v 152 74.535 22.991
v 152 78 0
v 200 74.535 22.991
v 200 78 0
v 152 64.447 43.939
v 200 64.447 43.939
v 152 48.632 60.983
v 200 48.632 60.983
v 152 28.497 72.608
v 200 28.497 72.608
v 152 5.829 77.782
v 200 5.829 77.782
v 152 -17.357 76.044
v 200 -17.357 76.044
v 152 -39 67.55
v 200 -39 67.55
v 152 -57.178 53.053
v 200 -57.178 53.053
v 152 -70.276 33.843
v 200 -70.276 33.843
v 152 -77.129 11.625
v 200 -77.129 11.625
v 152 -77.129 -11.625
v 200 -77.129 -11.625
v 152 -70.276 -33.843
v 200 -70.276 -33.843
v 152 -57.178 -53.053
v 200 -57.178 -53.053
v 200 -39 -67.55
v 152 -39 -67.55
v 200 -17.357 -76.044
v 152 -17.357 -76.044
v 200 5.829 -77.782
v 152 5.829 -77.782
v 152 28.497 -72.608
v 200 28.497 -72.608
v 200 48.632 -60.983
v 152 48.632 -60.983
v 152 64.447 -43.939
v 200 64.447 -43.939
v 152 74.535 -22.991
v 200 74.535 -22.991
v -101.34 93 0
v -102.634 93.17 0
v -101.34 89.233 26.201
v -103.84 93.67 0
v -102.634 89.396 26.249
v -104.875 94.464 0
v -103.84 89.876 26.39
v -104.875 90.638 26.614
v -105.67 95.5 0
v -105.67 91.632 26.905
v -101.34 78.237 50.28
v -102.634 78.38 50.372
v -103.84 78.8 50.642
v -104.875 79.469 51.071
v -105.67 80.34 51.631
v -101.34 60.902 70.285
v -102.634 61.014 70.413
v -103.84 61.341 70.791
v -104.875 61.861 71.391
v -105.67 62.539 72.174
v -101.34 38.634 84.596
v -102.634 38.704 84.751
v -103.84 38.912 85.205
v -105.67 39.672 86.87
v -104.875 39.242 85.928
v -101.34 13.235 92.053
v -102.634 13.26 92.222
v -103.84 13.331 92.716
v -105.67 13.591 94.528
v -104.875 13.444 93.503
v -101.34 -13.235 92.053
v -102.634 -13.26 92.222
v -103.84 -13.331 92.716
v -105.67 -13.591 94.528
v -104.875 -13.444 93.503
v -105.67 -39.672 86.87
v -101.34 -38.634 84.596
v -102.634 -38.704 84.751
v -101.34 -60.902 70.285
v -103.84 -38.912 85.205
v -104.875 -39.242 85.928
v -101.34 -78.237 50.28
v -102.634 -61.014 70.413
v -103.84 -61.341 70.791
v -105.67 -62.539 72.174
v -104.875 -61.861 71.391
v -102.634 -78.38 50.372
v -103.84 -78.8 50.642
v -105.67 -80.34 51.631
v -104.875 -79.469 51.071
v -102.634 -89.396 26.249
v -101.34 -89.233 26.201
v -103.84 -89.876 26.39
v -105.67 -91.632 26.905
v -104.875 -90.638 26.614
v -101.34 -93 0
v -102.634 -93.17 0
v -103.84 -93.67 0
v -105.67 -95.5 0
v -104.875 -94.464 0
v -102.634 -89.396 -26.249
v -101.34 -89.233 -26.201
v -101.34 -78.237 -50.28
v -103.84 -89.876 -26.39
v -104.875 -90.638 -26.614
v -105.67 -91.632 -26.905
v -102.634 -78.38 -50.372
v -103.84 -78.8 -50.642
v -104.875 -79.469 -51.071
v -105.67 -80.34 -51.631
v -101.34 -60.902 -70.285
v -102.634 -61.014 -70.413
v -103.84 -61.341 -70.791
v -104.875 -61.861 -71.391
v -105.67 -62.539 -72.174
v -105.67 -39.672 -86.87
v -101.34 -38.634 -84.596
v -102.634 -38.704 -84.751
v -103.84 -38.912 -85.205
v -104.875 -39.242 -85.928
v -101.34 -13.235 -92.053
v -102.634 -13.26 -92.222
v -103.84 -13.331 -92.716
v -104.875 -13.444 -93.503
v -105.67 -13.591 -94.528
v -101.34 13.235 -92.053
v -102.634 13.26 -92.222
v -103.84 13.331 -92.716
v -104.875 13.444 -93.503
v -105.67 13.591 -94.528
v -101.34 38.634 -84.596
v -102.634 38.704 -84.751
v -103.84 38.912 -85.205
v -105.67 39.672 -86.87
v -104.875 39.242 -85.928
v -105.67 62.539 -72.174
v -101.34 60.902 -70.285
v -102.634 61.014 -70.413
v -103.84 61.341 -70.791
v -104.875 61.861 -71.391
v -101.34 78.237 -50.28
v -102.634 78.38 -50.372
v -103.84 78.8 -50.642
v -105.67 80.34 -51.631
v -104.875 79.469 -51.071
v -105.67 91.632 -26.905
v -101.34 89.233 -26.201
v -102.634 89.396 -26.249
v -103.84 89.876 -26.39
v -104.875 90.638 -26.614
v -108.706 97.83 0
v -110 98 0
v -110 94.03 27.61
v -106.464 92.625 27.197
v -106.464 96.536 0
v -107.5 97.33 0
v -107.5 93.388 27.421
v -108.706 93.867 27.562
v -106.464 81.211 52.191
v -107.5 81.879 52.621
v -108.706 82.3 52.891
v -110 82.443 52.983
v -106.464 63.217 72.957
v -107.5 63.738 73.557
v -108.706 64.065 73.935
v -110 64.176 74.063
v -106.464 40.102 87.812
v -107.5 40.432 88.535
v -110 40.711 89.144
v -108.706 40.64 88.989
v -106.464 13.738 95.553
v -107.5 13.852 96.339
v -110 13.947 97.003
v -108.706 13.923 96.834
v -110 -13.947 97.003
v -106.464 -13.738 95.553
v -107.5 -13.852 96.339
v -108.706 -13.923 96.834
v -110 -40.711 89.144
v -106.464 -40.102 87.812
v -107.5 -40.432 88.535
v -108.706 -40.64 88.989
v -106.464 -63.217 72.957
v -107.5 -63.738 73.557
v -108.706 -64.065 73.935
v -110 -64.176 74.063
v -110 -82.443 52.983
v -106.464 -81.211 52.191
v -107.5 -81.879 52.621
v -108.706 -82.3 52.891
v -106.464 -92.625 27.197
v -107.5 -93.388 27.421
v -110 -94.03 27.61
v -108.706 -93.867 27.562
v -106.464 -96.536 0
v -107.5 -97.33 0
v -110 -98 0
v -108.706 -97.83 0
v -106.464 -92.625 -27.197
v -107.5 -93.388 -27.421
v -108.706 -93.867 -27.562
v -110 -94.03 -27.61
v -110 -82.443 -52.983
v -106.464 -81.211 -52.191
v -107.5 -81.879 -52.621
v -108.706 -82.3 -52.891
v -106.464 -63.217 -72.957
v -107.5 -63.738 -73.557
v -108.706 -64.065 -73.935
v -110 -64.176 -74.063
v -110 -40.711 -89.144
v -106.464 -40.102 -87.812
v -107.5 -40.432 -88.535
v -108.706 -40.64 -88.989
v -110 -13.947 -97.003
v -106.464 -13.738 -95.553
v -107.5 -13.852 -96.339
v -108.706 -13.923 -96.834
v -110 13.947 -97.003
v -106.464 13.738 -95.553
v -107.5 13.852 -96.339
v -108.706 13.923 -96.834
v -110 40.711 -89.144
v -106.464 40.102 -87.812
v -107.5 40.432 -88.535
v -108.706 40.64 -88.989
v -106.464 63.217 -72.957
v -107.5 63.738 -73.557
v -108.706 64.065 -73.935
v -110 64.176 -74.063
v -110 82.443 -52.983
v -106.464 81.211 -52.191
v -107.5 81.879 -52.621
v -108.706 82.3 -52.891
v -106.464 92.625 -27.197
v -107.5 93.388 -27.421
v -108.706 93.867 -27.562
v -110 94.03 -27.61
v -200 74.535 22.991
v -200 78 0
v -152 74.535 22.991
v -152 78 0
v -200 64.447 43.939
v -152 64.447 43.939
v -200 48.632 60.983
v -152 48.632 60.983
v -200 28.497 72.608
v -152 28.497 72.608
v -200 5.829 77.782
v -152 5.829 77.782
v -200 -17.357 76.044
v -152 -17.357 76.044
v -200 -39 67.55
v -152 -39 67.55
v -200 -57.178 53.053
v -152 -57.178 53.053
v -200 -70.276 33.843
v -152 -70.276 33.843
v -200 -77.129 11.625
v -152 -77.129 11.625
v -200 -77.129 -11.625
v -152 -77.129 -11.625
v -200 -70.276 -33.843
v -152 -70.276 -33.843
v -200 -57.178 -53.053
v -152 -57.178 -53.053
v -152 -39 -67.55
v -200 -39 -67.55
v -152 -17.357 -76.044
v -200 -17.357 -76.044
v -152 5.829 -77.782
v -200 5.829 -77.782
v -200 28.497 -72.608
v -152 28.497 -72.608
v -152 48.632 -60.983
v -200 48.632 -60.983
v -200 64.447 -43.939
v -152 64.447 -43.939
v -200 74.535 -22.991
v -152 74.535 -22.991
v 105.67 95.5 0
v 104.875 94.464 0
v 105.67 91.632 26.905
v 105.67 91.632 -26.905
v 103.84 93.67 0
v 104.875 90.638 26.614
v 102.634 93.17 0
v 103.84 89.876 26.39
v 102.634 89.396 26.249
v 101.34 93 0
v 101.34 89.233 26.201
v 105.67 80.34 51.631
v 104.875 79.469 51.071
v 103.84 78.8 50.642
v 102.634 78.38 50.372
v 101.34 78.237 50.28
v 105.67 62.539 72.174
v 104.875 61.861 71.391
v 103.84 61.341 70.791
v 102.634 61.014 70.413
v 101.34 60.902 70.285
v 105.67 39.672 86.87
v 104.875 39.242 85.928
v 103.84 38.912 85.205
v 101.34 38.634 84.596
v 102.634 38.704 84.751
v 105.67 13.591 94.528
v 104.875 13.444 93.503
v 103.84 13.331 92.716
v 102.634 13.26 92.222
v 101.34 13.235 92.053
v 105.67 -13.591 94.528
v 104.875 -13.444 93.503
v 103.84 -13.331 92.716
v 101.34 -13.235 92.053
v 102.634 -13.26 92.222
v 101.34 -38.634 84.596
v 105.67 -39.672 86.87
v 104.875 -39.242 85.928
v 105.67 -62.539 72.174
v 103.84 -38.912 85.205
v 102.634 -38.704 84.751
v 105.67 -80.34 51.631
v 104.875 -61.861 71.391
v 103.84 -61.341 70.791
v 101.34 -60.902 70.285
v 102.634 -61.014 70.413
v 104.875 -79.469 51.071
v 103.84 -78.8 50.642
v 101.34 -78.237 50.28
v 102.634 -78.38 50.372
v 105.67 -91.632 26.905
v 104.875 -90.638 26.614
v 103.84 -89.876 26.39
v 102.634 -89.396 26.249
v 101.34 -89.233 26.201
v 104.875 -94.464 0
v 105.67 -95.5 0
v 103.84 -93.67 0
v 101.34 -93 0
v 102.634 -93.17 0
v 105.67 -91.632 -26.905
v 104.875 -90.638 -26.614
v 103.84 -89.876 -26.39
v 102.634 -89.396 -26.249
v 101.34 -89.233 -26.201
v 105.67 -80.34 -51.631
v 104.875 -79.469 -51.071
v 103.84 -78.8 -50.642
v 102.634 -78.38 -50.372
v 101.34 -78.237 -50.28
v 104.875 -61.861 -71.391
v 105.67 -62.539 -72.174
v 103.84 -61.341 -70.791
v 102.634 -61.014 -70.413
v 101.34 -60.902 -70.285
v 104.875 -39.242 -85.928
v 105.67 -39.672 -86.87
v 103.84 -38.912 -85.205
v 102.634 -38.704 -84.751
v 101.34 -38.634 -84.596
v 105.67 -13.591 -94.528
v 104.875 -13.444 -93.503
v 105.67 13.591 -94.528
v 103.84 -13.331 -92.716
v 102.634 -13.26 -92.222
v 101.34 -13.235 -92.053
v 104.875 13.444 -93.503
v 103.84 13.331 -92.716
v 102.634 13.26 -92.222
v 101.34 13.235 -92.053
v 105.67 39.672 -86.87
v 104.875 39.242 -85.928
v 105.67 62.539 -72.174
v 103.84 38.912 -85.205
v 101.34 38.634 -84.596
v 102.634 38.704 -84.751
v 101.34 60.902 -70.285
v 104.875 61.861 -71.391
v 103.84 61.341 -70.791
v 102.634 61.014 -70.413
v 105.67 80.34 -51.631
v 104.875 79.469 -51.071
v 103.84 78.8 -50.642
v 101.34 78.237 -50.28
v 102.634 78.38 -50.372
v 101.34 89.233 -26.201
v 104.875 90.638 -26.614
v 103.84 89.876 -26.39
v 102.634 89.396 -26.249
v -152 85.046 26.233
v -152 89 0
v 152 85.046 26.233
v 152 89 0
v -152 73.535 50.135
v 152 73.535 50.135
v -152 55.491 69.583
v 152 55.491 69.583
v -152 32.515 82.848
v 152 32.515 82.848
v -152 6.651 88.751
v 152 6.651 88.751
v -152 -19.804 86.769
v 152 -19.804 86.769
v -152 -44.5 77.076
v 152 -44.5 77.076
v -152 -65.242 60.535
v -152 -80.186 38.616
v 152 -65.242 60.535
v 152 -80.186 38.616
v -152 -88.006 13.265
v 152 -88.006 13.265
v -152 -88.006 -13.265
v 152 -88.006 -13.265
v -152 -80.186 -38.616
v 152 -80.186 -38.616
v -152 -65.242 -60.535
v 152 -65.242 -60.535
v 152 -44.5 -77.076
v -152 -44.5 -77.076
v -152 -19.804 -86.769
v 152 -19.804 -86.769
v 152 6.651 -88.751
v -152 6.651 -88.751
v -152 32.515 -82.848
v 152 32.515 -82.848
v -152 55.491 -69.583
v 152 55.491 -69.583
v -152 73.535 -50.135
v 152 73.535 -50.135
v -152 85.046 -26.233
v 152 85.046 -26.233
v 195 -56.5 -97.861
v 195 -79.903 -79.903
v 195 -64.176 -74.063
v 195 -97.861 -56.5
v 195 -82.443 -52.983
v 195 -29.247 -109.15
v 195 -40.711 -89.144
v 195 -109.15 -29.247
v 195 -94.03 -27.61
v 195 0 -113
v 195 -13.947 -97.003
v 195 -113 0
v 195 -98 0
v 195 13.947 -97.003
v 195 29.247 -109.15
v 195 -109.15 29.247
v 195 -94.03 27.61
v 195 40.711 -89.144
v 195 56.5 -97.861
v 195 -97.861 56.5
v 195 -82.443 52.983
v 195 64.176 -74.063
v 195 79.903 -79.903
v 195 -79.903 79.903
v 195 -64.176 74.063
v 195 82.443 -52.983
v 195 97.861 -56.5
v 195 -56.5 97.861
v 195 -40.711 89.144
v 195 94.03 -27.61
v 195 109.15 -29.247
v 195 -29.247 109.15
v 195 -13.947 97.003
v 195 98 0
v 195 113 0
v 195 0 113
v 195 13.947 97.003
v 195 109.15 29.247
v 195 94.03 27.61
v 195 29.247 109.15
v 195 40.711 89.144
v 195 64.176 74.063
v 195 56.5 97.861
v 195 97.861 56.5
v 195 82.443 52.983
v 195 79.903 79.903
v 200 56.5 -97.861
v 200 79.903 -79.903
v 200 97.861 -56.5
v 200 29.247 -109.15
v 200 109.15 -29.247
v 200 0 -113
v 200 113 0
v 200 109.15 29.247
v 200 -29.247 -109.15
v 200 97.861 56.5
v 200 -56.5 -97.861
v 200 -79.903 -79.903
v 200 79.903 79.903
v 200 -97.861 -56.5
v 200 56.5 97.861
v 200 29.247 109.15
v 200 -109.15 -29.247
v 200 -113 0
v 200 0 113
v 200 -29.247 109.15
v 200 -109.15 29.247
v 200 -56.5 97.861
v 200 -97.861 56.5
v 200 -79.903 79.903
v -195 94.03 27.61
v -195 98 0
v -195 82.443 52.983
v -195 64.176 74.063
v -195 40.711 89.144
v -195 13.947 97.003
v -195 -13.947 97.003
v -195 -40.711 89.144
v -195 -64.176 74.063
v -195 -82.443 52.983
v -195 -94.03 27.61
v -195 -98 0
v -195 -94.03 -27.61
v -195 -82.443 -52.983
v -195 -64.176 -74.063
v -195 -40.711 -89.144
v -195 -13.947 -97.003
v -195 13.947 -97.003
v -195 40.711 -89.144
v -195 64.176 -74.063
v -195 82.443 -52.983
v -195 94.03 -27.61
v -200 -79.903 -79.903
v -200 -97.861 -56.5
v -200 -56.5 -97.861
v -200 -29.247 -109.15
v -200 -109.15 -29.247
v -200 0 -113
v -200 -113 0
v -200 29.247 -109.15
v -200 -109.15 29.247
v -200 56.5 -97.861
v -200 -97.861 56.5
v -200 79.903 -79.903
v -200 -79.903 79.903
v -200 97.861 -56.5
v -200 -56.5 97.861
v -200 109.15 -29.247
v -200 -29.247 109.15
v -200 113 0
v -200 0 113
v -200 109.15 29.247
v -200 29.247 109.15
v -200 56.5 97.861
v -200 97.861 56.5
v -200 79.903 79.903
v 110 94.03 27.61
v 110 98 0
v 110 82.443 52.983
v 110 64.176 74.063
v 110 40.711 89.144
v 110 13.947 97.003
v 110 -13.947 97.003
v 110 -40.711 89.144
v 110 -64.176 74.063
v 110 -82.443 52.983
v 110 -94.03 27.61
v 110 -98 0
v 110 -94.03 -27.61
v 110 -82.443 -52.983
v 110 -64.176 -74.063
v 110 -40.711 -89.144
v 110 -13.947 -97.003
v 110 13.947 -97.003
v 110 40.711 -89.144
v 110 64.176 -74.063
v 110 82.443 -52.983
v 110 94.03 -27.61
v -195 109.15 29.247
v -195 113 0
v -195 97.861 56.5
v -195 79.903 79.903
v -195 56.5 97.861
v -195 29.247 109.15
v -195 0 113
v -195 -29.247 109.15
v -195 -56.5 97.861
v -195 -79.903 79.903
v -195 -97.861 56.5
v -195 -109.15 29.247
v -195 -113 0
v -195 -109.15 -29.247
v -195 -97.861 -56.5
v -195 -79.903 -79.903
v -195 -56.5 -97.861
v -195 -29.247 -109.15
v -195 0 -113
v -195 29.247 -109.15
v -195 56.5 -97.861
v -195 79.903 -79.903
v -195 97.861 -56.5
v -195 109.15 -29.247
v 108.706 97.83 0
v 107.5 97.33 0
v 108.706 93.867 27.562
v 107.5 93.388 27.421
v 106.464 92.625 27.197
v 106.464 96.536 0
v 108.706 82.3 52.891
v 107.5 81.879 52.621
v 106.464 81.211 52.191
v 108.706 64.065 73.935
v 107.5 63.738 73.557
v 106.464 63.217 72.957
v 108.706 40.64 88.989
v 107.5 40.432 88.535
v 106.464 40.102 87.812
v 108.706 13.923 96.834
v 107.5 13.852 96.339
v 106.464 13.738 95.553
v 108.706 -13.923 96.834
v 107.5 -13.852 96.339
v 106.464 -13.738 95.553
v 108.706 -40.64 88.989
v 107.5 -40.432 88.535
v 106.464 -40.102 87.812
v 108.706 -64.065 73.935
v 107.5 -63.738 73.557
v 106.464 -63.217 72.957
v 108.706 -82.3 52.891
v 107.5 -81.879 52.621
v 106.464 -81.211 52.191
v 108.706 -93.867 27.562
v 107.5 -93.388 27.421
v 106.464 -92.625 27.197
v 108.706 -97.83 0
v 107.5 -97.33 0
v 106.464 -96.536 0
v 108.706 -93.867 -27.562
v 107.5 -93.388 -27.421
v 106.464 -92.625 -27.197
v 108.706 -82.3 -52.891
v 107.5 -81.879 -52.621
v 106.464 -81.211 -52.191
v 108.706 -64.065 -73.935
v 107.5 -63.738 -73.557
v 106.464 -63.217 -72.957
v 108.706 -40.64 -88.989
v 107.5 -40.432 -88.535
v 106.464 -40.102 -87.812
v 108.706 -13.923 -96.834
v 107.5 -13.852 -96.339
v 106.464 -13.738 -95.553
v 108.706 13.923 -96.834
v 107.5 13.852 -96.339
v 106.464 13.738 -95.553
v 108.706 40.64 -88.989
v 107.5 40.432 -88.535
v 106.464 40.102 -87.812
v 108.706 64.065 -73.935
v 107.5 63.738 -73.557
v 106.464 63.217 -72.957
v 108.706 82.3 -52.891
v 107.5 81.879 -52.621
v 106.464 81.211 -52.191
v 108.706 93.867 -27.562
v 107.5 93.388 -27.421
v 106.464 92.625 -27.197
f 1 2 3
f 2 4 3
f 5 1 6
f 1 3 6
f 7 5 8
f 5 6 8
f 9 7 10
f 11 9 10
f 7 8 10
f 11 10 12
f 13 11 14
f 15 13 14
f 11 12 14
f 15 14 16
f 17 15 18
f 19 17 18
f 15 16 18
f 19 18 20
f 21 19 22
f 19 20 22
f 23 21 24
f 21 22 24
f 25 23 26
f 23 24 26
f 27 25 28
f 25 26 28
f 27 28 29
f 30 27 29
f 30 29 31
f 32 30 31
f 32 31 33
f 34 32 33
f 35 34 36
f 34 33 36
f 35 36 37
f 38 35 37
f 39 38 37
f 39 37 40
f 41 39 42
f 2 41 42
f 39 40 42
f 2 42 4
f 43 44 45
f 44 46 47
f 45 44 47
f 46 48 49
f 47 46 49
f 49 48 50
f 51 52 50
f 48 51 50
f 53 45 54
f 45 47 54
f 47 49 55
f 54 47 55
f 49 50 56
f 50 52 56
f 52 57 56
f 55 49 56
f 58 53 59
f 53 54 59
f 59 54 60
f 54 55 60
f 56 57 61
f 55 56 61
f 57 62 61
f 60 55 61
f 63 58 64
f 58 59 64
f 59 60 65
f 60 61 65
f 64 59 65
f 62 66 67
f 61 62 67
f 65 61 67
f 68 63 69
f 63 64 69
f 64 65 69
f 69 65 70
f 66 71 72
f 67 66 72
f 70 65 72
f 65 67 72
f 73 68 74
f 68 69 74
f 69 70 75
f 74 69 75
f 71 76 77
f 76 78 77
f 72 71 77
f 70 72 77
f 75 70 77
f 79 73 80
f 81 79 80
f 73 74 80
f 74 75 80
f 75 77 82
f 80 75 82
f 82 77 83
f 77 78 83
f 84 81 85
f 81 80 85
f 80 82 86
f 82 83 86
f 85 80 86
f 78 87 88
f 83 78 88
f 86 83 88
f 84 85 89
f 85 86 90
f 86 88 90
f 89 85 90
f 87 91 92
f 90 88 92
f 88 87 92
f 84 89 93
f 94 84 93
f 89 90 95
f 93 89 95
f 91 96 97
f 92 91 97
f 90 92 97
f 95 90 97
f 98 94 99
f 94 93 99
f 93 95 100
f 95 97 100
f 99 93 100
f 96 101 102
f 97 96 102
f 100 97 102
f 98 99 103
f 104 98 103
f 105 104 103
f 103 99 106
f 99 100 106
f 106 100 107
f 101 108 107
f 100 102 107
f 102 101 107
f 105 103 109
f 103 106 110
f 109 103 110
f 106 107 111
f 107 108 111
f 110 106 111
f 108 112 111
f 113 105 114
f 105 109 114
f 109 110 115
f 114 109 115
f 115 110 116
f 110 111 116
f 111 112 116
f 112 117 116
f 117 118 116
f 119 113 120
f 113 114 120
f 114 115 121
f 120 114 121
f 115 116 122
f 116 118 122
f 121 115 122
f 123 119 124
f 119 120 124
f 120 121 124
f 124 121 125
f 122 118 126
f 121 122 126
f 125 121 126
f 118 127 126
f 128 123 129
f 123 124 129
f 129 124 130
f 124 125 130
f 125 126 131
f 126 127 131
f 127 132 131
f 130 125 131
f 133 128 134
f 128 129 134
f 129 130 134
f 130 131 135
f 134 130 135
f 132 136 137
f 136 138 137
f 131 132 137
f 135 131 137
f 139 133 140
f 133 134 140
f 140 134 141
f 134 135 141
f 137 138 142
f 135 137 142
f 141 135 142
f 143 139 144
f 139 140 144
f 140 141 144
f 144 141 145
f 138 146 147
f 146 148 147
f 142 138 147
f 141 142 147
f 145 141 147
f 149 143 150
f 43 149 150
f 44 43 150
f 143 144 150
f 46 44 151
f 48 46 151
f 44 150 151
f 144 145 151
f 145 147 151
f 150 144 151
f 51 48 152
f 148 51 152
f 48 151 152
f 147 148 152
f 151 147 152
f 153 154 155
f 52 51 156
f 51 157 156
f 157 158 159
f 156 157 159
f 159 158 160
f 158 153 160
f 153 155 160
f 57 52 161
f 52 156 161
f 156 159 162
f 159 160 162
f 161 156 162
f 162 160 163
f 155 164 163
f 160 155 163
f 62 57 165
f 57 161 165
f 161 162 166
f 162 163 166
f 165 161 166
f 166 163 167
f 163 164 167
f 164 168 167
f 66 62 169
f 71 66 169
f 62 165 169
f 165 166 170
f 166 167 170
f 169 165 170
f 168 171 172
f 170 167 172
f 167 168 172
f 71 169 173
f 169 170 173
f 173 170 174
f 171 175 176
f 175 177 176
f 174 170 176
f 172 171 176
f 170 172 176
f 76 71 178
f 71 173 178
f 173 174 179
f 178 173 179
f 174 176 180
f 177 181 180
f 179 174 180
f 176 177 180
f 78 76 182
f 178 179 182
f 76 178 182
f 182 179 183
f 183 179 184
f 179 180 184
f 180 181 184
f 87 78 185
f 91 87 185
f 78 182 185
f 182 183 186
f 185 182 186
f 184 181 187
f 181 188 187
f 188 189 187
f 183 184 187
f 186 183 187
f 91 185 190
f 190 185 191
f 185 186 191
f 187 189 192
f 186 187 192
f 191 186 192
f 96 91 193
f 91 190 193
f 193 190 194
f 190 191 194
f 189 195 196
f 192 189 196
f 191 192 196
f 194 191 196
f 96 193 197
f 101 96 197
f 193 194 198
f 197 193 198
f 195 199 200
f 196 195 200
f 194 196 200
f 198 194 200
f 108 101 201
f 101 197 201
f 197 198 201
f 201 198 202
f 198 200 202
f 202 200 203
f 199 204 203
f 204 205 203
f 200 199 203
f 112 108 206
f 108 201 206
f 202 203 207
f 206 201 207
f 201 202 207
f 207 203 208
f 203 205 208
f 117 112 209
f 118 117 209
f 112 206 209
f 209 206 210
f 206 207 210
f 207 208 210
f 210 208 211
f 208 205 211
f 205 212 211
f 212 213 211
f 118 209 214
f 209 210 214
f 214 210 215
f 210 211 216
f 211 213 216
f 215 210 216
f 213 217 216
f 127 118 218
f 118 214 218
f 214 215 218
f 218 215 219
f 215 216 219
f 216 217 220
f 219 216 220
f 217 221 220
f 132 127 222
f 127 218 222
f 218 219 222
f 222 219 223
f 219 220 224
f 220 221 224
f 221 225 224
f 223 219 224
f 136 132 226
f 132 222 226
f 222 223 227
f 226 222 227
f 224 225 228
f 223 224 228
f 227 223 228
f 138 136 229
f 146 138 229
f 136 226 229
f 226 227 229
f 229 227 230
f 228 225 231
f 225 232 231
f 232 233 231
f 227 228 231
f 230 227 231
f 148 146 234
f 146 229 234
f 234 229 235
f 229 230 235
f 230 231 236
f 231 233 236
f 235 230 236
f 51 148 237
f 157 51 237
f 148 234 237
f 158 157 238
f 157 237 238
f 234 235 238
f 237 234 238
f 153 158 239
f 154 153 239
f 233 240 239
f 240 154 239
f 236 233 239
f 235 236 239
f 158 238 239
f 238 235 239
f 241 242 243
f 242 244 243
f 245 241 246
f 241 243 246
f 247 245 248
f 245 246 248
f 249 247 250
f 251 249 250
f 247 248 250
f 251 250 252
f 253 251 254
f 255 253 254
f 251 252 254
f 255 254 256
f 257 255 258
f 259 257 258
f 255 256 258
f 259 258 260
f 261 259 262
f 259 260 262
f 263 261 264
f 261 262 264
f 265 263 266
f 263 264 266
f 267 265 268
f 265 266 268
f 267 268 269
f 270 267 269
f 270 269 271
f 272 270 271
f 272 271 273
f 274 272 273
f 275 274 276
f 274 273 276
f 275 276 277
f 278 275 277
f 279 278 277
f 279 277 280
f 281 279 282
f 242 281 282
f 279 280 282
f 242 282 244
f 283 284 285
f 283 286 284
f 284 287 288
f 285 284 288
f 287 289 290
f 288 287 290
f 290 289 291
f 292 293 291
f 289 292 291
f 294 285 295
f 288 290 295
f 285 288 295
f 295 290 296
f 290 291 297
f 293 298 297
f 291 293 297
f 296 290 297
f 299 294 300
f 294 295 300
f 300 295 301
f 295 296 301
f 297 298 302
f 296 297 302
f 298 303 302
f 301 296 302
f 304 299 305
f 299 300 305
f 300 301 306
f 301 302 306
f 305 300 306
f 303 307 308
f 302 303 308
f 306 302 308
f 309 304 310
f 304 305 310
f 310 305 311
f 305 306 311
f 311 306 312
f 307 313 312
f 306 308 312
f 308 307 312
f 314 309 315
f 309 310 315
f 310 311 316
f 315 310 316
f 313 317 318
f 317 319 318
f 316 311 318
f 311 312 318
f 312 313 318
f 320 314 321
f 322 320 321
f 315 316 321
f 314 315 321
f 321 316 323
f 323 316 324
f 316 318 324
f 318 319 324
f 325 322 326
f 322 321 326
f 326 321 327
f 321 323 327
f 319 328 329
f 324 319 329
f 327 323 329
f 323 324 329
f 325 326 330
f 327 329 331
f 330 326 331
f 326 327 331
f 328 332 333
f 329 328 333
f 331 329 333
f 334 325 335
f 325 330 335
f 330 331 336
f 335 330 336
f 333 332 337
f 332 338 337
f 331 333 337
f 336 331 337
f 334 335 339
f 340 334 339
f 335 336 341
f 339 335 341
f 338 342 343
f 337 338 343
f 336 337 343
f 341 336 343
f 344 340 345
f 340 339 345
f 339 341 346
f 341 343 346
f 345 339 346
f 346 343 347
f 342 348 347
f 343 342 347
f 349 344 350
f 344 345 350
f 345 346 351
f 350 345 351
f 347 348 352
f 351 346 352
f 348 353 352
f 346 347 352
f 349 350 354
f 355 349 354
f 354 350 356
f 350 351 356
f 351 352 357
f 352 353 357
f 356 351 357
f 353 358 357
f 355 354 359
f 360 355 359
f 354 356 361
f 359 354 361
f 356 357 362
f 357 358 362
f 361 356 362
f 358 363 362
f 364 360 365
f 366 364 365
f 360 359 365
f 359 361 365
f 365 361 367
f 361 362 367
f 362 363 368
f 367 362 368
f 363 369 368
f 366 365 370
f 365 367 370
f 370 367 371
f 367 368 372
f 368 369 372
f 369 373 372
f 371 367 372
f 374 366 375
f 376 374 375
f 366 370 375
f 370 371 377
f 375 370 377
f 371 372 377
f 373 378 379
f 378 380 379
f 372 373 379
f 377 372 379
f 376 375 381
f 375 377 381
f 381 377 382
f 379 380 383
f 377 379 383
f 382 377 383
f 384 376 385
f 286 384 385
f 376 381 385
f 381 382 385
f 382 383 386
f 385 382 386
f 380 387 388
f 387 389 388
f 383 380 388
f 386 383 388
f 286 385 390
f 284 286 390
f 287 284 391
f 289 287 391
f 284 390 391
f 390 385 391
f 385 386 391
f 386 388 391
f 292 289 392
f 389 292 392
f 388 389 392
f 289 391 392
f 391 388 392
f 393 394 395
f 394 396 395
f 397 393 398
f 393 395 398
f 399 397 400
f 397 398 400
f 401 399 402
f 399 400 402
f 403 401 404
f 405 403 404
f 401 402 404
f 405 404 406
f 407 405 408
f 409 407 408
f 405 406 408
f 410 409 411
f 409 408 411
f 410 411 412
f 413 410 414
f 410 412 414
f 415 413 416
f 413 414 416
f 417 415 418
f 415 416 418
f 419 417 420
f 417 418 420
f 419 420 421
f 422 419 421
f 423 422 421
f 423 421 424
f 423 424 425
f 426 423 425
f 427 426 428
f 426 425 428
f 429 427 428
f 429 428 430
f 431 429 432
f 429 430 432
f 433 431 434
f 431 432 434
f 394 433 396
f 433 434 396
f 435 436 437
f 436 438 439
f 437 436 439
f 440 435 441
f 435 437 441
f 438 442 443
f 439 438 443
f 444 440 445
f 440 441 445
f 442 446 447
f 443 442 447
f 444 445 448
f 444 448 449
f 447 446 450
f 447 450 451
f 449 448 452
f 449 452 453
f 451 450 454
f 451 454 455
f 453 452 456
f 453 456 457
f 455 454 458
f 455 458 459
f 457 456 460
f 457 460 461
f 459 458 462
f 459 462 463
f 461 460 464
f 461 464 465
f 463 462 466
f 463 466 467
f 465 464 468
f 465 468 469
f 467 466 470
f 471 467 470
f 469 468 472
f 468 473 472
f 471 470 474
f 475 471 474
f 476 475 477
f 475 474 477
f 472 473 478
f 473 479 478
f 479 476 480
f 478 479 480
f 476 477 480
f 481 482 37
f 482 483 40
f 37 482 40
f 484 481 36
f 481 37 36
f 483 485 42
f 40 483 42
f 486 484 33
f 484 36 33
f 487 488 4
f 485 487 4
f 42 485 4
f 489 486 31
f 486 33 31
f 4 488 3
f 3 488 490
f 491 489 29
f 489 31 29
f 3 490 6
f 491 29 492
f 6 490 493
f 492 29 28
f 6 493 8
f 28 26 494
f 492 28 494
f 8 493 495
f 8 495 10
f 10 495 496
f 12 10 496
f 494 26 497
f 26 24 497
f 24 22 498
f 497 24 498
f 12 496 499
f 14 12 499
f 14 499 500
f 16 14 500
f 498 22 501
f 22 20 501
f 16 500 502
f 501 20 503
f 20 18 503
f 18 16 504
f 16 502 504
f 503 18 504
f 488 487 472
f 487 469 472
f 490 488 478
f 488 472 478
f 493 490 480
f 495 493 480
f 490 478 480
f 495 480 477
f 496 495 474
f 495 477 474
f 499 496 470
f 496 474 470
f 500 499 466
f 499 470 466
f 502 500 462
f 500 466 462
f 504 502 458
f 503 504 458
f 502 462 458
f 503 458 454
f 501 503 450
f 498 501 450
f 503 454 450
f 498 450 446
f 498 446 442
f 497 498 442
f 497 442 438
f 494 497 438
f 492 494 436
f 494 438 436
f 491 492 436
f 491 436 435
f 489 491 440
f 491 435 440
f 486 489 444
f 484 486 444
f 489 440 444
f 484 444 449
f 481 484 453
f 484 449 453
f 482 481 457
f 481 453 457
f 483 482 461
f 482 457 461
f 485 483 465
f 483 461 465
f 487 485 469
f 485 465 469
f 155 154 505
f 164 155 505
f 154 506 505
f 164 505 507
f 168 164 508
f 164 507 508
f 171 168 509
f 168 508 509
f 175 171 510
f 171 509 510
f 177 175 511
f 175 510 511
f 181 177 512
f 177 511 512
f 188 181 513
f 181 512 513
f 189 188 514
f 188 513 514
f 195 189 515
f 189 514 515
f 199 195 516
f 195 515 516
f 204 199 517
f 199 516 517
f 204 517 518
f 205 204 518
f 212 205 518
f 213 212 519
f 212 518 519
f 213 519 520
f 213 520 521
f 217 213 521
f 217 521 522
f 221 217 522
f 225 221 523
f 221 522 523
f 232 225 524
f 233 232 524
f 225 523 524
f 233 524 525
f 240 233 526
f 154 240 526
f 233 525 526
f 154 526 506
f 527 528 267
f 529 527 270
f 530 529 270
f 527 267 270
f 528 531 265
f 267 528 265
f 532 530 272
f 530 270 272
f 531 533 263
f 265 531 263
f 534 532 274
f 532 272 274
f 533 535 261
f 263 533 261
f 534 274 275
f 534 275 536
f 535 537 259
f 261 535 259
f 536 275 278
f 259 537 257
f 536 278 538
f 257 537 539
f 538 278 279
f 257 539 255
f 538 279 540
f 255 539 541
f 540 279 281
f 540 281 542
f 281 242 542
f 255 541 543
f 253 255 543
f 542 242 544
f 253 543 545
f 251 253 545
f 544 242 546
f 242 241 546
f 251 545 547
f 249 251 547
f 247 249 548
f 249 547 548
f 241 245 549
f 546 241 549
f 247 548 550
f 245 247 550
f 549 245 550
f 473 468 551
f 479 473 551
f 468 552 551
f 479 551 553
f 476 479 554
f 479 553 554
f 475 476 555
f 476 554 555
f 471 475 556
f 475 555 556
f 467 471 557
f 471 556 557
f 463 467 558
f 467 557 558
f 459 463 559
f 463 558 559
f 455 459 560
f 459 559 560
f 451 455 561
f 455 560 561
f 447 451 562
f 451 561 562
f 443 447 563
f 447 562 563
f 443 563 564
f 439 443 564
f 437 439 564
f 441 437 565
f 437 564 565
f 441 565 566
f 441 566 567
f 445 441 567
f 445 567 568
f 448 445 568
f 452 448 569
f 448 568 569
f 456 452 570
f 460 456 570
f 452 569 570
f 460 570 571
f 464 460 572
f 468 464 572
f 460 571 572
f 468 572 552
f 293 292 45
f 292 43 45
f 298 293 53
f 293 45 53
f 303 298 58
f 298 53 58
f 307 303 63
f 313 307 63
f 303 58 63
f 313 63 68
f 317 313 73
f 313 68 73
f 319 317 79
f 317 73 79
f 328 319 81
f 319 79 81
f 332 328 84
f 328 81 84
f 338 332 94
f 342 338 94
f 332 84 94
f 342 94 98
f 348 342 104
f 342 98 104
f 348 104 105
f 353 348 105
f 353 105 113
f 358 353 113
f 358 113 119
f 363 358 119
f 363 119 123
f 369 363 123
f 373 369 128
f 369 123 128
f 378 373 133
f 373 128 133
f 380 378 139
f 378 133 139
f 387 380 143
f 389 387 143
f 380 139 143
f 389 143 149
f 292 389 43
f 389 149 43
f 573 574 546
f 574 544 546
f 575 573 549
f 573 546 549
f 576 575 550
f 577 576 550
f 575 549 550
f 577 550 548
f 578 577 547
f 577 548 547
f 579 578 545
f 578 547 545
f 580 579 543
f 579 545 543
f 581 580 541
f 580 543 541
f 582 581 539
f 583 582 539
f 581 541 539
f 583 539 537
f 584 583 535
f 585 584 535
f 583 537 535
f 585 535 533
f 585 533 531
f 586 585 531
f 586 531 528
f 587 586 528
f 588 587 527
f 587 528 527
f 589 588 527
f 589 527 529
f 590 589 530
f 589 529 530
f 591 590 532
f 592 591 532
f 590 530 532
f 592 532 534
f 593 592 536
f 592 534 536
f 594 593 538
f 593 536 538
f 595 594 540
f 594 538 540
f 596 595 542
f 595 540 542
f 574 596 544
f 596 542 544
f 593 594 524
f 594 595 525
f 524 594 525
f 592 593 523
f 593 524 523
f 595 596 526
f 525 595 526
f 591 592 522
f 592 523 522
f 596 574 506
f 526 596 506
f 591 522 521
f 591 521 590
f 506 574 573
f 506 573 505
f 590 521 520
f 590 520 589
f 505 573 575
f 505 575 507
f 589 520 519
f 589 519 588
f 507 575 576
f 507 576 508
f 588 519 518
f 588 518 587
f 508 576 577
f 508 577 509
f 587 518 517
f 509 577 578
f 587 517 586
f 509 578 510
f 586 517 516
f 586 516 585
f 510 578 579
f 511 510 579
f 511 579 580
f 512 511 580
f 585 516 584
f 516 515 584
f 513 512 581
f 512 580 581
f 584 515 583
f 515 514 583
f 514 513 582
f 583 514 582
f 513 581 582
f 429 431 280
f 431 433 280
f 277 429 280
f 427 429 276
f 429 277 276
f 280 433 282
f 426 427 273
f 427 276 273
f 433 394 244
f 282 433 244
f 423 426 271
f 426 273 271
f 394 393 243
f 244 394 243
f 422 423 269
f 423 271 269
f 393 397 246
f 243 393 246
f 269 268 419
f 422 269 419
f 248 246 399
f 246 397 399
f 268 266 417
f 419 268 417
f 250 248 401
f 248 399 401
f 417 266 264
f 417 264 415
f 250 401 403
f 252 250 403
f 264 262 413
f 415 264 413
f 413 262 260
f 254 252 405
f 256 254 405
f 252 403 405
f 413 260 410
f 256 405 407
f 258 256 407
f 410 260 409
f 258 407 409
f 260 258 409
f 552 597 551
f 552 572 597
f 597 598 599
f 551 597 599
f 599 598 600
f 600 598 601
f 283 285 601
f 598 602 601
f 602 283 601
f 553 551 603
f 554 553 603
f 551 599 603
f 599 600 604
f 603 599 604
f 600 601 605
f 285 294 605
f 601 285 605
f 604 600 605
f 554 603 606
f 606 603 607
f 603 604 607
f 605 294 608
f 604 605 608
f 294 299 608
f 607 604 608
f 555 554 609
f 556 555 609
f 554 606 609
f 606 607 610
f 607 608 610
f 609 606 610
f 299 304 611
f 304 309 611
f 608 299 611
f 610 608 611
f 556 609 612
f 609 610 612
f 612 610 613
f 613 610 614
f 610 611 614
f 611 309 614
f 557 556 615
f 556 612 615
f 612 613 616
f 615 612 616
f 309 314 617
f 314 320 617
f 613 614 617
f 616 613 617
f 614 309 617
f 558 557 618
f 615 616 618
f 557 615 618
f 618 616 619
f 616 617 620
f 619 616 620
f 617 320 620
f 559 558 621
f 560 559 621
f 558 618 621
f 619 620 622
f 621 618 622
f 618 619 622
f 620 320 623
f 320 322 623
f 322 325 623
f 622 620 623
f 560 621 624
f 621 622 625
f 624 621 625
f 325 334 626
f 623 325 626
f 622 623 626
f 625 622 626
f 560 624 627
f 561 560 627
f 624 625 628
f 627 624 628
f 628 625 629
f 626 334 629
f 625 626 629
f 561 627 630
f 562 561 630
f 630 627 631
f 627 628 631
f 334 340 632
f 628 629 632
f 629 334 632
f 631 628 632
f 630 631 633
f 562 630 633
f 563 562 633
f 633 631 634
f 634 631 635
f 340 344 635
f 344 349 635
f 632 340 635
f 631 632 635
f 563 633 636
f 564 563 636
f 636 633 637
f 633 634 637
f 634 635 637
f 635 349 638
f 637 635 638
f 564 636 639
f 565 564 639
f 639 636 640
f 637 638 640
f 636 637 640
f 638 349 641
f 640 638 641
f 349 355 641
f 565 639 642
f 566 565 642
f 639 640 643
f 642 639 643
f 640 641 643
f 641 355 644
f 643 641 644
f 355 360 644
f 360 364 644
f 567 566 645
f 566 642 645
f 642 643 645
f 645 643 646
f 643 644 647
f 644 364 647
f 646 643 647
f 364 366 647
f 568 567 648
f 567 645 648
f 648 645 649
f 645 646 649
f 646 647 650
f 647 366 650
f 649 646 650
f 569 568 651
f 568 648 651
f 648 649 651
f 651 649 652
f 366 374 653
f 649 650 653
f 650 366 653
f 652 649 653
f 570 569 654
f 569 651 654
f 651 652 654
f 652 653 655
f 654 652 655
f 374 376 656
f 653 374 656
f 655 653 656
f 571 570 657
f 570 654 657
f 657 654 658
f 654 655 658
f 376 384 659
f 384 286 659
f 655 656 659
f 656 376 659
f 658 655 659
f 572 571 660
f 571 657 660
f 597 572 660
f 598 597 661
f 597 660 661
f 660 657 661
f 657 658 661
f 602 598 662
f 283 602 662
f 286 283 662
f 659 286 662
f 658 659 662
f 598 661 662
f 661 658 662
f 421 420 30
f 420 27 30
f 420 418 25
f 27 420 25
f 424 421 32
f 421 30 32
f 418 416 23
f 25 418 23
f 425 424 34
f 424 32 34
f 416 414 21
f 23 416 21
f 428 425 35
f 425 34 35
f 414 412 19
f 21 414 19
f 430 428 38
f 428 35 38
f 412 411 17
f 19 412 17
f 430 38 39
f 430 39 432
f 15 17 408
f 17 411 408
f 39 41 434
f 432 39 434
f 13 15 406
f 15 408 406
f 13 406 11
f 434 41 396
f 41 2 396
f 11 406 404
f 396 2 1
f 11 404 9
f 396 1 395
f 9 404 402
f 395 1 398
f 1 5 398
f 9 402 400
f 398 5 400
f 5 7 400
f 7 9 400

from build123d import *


with BuildPart() as f1:
    # F0 (on Top) → F1 (revolve)
    with BuildSketch(Plane.XY):
        with BuildLine():
            ThreePointArc((-105.669873, 95.5), (-107.5, 97.330127), (-110, 98))
            Line((-110, 98), (-195, 98))
            Line((-195, 98), (-195, 113))
            Line((-195, 113), (-200, 113))
            Line((-200, 113), (-200, 98))
            Line((-200, 98), (-200, 78))
            Line((-200, 78), (-152, 78))
            Line((-152, 78), (-152, 89))
            Line((-152, 89), (0, 89))
            Line((0, 89), (0, 93))
            Line((0, 93), (-101.339746, 93))
            ThreePointArc((-101.339746, 93), (-103.839746, 93.669873), (-105.669873, 95.5))
        make_face()
        with BuildLine():
            Line((101.339746, 93), (0, 93))
            Line((0, 93), (0, 89))
            Line((0, 89), (152, 89))
            Line((152, 89), (152, 78))
            Line((152, 78), (200, 78))
            Line((200, 78), (200, 98))
            Line((200, 98), (200, 113))
            Line((200, 113), (195, 113))
            Line((195, 113), (195, 98))
            Line((195, 98), (110, 98))
            ThreePointArc((110, 98), (107.5, 97.330127), (105.669873, 95.5))
            ThreePointArc((105.669873, 95.5), (103.839746, 93.669873), (101.339746, 93))
        make_face()
    revolve(axis=Axis((-6.106503, 0, 0), (1, 0, 0)))


solid = f1.part
